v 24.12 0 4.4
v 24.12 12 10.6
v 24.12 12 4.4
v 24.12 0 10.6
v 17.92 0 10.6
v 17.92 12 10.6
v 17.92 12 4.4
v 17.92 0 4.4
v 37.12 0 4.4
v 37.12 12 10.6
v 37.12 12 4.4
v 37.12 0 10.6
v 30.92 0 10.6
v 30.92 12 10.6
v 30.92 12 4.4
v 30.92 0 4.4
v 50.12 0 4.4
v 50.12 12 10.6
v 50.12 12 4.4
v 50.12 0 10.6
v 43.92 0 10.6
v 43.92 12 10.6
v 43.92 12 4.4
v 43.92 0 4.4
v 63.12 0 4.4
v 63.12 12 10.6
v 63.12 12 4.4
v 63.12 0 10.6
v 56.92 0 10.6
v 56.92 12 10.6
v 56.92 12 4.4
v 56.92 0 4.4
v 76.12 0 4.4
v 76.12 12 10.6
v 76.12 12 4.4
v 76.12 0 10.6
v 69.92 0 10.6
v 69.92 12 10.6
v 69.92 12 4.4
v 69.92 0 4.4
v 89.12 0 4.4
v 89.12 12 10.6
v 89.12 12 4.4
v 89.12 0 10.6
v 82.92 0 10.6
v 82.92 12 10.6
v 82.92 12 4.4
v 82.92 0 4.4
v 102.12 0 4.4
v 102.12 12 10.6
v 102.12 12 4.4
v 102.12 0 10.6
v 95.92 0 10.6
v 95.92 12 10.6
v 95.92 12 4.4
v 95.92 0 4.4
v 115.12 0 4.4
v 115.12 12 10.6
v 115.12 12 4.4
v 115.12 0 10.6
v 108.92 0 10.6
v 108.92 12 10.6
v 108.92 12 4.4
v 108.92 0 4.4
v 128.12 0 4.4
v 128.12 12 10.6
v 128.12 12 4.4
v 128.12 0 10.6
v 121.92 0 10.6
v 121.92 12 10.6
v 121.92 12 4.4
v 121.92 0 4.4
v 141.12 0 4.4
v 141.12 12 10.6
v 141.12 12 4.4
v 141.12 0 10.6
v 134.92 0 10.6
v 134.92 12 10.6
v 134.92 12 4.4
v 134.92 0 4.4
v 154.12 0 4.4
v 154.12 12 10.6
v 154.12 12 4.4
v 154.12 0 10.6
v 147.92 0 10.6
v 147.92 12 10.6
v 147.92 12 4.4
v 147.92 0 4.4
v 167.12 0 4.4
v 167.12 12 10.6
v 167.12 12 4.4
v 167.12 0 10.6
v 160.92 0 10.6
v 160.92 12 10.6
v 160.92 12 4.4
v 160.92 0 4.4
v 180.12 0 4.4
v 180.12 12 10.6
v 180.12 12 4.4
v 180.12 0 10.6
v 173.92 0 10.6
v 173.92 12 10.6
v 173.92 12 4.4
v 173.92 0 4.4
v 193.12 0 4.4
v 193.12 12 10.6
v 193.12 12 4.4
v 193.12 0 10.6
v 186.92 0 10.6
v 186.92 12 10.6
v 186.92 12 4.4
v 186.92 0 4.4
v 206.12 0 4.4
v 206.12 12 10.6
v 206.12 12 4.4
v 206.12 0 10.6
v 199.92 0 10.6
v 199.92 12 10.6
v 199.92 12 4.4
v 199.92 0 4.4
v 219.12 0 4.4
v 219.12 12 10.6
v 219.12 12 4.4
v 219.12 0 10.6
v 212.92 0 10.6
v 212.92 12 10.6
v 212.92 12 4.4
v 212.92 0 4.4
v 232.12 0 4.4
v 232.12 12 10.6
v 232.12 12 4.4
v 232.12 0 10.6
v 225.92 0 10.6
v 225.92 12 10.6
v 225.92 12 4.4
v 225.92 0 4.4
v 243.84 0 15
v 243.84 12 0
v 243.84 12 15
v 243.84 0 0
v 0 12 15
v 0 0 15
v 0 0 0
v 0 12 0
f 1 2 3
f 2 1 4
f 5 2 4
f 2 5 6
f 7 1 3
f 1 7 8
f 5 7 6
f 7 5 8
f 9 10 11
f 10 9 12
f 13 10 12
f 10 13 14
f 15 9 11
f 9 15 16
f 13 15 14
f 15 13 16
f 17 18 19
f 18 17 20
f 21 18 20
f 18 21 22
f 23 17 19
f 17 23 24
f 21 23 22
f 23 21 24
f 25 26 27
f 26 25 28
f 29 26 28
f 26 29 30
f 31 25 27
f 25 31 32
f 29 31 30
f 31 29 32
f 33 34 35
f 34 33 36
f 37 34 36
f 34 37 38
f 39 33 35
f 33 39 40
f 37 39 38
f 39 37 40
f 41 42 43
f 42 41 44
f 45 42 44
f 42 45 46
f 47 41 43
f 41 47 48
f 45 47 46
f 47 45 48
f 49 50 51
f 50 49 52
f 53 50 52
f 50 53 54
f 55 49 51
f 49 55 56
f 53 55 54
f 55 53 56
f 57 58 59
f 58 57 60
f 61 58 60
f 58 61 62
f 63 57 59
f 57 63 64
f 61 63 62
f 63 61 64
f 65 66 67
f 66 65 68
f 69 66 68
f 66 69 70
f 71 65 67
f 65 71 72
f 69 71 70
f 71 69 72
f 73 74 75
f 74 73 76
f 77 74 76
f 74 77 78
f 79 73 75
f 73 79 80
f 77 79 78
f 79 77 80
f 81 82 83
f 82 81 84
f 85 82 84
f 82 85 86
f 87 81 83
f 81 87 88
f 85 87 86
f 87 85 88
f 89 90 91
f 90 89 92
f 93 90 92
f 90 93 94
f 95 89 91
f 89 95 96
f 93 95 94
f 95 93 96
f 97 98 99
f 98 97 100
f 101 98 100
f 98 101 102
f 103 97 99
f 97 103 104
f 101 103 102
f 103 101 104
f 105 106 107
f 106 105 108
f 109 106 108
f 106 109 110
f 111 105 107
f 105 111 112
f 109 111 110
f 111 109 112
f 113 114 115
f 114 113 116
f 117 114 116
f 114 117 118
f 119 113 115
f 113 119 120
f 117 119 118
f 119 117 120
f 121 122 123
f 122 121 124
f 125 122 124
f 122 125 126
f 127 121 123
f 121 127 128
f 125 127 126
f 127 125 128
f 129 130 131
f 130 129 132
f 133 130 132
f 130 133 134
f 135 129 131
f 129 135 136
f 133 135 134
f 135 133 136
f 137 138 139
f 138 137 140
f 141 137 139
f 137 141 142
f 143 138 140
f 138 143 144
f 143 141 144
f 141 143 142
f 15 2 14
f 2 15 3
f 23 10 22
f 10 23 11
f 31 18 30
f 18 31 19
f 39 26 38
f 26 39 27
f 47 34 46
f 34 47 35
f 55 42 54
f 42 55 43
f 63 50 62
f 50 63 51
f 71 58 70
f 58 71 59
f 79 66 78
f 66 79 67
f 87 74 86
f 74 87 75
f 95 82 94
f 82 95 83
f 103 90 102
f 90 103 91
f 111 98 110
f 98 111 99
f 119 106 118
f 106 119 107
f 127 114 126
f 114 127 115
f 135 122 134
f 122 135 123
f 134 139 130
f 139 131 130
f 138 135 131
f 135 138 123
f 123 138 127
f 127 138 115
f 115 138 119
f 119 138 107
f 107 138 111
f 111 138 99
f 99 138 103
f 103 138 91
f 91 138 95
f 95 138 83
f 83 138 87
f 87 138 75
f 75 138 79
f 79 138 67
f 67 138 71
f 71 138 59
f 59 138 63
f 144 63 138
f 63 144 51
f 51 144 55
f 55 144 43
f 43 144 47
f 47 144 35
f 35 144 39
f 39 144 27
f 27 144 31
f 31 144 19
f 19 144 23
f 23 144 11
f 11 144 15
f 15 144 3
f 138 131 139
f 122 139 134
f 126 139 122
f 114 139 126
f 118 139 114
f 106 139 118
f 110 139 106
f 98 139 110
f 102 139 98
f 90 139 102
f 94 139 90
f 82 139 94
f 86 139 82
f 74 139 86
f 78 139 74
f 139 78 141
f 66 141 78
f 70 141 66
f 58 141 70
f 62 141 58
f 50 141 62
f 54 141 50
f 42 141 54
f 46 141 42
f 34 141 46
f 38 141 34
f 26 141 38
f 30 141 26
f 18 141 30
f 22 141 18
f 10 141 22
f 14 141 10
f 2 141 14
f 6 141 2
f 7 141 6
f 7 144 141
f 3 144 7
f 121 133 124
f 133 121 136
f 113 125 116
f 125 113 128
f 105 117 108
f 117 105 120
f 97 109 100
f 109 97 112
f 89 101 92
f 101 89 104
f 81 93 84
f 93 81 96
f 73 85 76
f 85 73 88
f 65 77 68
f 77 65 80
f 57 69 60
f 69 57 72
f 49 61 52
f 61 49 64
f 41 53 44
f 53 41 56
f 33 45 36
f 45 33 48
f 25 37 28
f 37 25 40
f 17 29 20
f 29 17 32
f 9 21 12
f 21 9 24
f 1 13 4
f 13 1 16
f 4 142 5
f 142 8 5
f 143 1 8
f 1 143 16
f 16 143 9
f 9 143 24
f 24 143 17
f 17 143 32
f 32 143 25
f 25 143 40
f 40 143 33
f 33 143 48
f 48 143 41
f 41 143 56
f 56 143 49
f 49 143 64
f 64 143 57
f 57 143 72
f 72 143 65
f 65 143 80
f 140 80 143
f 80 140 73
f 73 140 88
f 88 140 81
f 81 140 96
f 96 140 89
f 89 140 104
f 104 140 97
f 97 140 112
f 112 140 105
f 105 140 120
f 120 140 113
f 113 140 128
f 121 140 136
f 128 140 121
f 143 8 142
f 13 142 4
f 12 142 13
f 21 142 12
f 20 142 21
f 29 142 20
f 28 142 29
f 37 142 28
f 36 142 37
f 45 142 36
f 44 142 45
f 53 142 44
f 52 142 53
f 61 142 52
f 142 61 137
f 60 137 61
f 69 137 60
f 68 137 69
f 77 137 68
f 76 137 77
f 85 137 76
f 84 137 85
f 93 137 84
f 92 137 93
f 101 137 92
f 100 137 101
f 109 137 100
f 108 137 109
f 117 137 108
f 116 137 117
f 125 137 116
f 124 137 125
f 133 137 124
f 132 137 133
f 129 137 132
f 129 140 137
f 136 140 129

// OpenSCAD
// Makerpanel System OpenSCAD Models
// Modular maker panel system with rack mounting support
// All dimensions in millimeters

// ============================================
// Constants
// ============================================

// Panel Units
HP = 5.08;           // Horizontal Pitch = 5.08mm (0.200")
U = 44.45;           // Vertical Unit = 44.45mm (1.75")

// M-LOK Specifications
MLOK_SLOT_WIDTH = 6.2;      // M-LOK slot width
MLOK_SLOT_SPACING = 13;     // Center-to-center spacing
MLOK_SLOT_DEPTH = 4;        // Depth of slot cutout

// Rack Specifications
RACK_HOLE_SPACING = 25.4;   // Standard EIA-310-D (1" = 25.4mm) = 5 HP
RACK_HOLE_DIAMETER = 6.5;   // M6 mounting holes (standard 19" rack)
RACK_RAIL_WIDTH = 19;       // Standard rack rail width
RACK_RAIL_DEPTH = 35;       // Standard rack rail depth
RACK_RAIL_THICKNESS = 3;    // Rail material thickness

// Rack Widths
RACK_19_WIDTH = 465.1;      // 19" rack outer width
RACK_19_USABLE = 432;       // 19" usable width (between rails)
RACK_10_WIDTH = 254;        // 10" rack outer width (approx)
RACK_10_USABLE = 203;       // 10" usable width (between rails)

// Panel Specifications
PANEL_THICKNESS = 3;        // Aluminum panel thickness
PANEL_DEPTH_MAX = 60;       // Maximum panel depth from front
MOUNT_HOLE_DIAMETER = 3.5;  // M3 mounting hole (for T-nuts)

// ============================================
// Utility Functions
// ============================================

// Convert HP to millimeters
function hp_to_mm(hp) = hp * HP;

// Convert U to millimeters
function u_to_mm(u) = u * U;

// ============================================
// Module: M-LOK Horizontal Cross-Rail
// ============================================

module mlok_crossrail(width, height=15, depth=12) {
    /*
    Creates an M-LOK compatible horizontal cross-rail
    Parameters:
      - width: rail length in mm
      - height: rail height in mm
      - depth: rail depth (front to back) in mm
    */
    
    // Calculate number of slots that fit in the width
    num_slots = floor((width - 20) / MLOK_SLOT_SPACING);
    first_slot_pos = (width - (num_slots - 1) * MLOK_SLOT_SPACING) / 2;
    
    difference() {
        // Base solid block
        cube([width, height, depth], center=false);
        
        // Cut M-LOK slots
        for (i = [0 : num_slots - 1]) {
            x_pos = first_slot_pos + i * MLOK_SLOT_SPACING;
            translate([x_pos, -1, depth/2 - MLOK_SLOT_WIDTH/2])
                cube([MLOK_SLOT_WIDTH, height + 2, MLOK_SLOT_WIDTH], center=false);
        }
    }
}

// ============================================
// Module: Rack Rail (Single)
// ============================================

module rack_rail(height) {
    /*
    Creates a single vertical rack rail with mounting holes
    Parameters:
      - height: rail height in mm (typically multiple of U)
    */
    
    // Calculate number of holes
    num_holes = floor(height / RACK_HOLE_SPACING);
    
    difference() {
        // Base rail
        cube([RACK_RAIL_WIDTH, height, RACK_RAIL_DEPTH]);
        
        // Mounting holes
        hole_start = RACK_HOLE_SPACING / 2;
        for (i = [0 : num_holes - 1]) {
            y_pos = hole_start + i * RACK_HOLE_SPACING;
            translate([RACK_RAIL_WIDTH/2, y_pos, -1])
                cylinder(r=RACK_HOLE_DIAMETER/2, h=RACK_RAIL_DEPTH + 2);
        }
    }
}

// ============================================
// Module: 19" Rack Assembly
// ============================================

module rack_19(height) {
    /*
    Creates a complete 19" rack frame
    Parameters:
      - height: total height in mm (typically multiple of U)
    */
    
    // Left rail
    translate([0, 0, 0])
        rack_rail(height);
    
    // Right rail
    translate([RACK_19_WIDTH - RACK_RAIL_WIDTH, 0, 0])
        rack_rail(height);
    
    // Top horizontal support
    translate([RACK_RAIL_WIDTH, height - 20, 0])
        cube([RACK_19_USABLE, 20, RACK_RAIL_DEPTH]);
    
    // Bottom horizontal support
    translate([RACK_RAIL_WIDTH, 0, 0])
        cube([RACK_19_USABLE, 20, RACK_RAIL_DEPTH]);
    
    // Back panel (optional - comment out if not needed)
    %translate([0, 0, RACK_RAIL_DEPTH - 2])
        cube([RACK_19_WIDTH, height, 2]);
}

// ============================================
// Module: 10" Rack Assembly
// ============================================

module rack_10(height) {
    /*
    Creates a complete 10" rack frame
    Parameters:
      - height: total height in mm (typically multiple of U)
    */
    
    rack_width = RACK_10_WIDTH;
    usable = RACK_10_USABLE;
    
    // Left rail
    translate([0, 0, 0])
        rack_rail(height);
    
    // Right rail
    translate([rack_width - RACK_RAIL_WIDTH, 0, 0])
        rack_rail(height);
    
    // Top support
    translate([RACK_RAIL_WIDTH, height - 20, 0])
        cube([usable, 20, RACK_RAIL_DEPTH]);
    
    // Bottom support
    translate([RACK_RAIL_WIDTH, 0, 0])
        cube([usable, 20, RACK_RAIL_DEPTH]);
    
    // Back panel (optional)
    %translate([0, 0, RACK_RAIL_DEPTH - 2])
        cube([rack_width, height, 2]);
}

// ============================================
// Module: Custom Width Rack
// ============================================

module rack_custom(width, height) {
    /*
    Creates a rack with custom width
    Parameters:
      - width: outer width in mm
      - height: height in mm
    */
    
    usable = width - 2 * RACK_RAIL_WIDTH;
    
    // Left rail
    translate([0, 0, 0])
        rack_rail(height);
    
    // Right rail
    translate([width - RACK_RAIL_WIDTH, 0, 0])
        rack_rail(height);
    
    // Top support
    translate([RACK_RAIL_WIDTH, height - 20, 0])
        cube([usable, 20, RACK_RAIL_DEPTH]);
    
    // Bottom support
    translate([RACK_RAIL_WIDTH, 0, 0])
        cube([usable, 20, RACK_RAIL_DEPTH]);
    
    // Back panel (optional)
    %translate([0, 0, RACK_RAIL_DEPTH - 2])
        cube([width, height, 2]);
}

// ============================================
// Module: Panel with M-LOK Mounting Holes
// ============================================

module makerpanel(width_hp, height_u, thickness=PANEL_THICKNESS) {
    /*
    Creates a maker panel with M-LOK mounting holes
    Parameters:
      - width_hp: width in HP units
      - height_u: height in U units
      - thickness: panel thickness in mm (default 3mm aluminum)
    */
    
    width_mm = hp_to_mm(width_hp);
    height_mm = u_to_mm(height_u);
    
    // Calculate mounting hole positions
    // Holes positioned to align with M-LOK slot centers (13mm spacing)
    hole_spacing = MLOK_SLOT_SPACING;
    num_holes_h = floor(width_mm / hole_spacing);
    num_holes_v = max(1, floor(height_mm / hole_spacing));
    
    hole_start_x = (width_mm - (num_holes_h - 1) * hole_spacing) / 2;
    hole_start_y = (height_mm - (num_holes_v - 1) * hole_spacing) / 2;
    
    difference() {
        // Base panel
        cube([width_mm, height_mm, thickness], center=false);
        
        // M-LOK mounting holes (vertical holes for T-nuts)
        for (i = [0 : num_holes_h - 1]) {
            for (j = [0 : num_holes_v - 1]) {
                x_pos = hole_start_x + i * hole_spacing;
                y_pos = hole_start_y + j * hole_spacing;
                
                // Only create holes near edges (2cm border minimum)
                if (x_pos >= 20 && x_pos <= width_mm - 20 &&
                    y_pos >= 20 && y_pos <= height_mm - 20) {
                    translate([x_pos, y_pos, -1])
                        cylinder(r=MOUNT_HOLE_DIAMETER/2, h=thickness + 2);
                }
            }
        }
    }
}

// ============================================
// Example Assemblies
// ============================================

// Example 1: 19" Rack with panels
module example_19_rack() {
    // Create 19" rack (6U height = 267mm)
    rack_19(u_to_mm(6));
    
    // Add cross-rails at 1U and 4U positions
    translate([RACK_RAIL_WIDTH, u_to_mm(1), RACK_RAIL_DEPTH - 15])
        mlok_crossrail(RACK_19_USABLE, height=12, depth=15);
    
    translate([RACK_RAIL_WIDTH, u_to_mm(4), RACK_RAIL_DEPTH - 15])
        mlok_crossrail(RACK_19_USABLE, height=12, depth=15);
    
    // Add sample panels
    translate([RACK_RAIL_WIDTH + 20, u_to_mm(1.5), RACK_RAIL_DEPTH])
        %makerpanel(8, 1);  // 8 HP × 1U panel
    
    translate([RACK_RAIL_WIDTH + 150, u_to_mm(4.5), RACK_RAIL_DEPTH])
        %makerpanel(6, 1);  // 6 HP × 1U panel
}

// Example 2: 10" Rack with panels
module example_10_rack() {
    // Create 10" rack (6U height)
    rack_10(u_to_mm(6));
    
    // Add cross-rails
    translate([RACK_RAIL_WIDTH, u_to_mm(1), RACK_RAIL_DEPTH - 15])
        mlok_crossrail(RACK_10_USABLE, height=12, depth=15);
    
    translate([RACK_RAIL_WIDTH, u_to_mm(4), RACK_RAIL_DEPTH - 15])
        mlok_crossrail(RACK_10_USABLE, height=12, depth=15);
    
    // Add sample panels
    translate([RACK_RAIL_WIDTH + 15, u_to_mm(1.5), RACK_RAIL_DEPTH])
        %makerpanel(6, 1);  // 6 HP × 1U
}

// Example 3: Standalone M-LOK cross-rail system
module example_standalone() {
    // Create a standalone cross-rail system (not rack-mounted)
    
    // Horizontal cross-rail (48 HP wide)
    translate([0, 0, 0])
        mlok_crossrail(hp_to_mm(48), height=12, depth=15);
    
    // Add sample panels
    translate([hp_to_mm(2), 20, 15])
        %makerpanel(8, 3);  // 8 HP × 3U
    
    translate([hp_to_mm(12), 20, 15])
        %makerpanel(12, 3);  // 12 HP × 3U
    
    translate([hp_to_mm(26), 20, 15])
        %makerpanel(16, 3);  // 16 HP × 3U
}

// ============================================
// Render Selection
// ============================================

// Uncomment the example you want to view:

// example_19_rack();
// example_10_rack();
example_standalone();

// Or render individual components:
// rack_19(u_to_mm(6));
// mlok_crossrail(hp_to_mm(48), 12, 15);
// makerpanel(8, 3);
